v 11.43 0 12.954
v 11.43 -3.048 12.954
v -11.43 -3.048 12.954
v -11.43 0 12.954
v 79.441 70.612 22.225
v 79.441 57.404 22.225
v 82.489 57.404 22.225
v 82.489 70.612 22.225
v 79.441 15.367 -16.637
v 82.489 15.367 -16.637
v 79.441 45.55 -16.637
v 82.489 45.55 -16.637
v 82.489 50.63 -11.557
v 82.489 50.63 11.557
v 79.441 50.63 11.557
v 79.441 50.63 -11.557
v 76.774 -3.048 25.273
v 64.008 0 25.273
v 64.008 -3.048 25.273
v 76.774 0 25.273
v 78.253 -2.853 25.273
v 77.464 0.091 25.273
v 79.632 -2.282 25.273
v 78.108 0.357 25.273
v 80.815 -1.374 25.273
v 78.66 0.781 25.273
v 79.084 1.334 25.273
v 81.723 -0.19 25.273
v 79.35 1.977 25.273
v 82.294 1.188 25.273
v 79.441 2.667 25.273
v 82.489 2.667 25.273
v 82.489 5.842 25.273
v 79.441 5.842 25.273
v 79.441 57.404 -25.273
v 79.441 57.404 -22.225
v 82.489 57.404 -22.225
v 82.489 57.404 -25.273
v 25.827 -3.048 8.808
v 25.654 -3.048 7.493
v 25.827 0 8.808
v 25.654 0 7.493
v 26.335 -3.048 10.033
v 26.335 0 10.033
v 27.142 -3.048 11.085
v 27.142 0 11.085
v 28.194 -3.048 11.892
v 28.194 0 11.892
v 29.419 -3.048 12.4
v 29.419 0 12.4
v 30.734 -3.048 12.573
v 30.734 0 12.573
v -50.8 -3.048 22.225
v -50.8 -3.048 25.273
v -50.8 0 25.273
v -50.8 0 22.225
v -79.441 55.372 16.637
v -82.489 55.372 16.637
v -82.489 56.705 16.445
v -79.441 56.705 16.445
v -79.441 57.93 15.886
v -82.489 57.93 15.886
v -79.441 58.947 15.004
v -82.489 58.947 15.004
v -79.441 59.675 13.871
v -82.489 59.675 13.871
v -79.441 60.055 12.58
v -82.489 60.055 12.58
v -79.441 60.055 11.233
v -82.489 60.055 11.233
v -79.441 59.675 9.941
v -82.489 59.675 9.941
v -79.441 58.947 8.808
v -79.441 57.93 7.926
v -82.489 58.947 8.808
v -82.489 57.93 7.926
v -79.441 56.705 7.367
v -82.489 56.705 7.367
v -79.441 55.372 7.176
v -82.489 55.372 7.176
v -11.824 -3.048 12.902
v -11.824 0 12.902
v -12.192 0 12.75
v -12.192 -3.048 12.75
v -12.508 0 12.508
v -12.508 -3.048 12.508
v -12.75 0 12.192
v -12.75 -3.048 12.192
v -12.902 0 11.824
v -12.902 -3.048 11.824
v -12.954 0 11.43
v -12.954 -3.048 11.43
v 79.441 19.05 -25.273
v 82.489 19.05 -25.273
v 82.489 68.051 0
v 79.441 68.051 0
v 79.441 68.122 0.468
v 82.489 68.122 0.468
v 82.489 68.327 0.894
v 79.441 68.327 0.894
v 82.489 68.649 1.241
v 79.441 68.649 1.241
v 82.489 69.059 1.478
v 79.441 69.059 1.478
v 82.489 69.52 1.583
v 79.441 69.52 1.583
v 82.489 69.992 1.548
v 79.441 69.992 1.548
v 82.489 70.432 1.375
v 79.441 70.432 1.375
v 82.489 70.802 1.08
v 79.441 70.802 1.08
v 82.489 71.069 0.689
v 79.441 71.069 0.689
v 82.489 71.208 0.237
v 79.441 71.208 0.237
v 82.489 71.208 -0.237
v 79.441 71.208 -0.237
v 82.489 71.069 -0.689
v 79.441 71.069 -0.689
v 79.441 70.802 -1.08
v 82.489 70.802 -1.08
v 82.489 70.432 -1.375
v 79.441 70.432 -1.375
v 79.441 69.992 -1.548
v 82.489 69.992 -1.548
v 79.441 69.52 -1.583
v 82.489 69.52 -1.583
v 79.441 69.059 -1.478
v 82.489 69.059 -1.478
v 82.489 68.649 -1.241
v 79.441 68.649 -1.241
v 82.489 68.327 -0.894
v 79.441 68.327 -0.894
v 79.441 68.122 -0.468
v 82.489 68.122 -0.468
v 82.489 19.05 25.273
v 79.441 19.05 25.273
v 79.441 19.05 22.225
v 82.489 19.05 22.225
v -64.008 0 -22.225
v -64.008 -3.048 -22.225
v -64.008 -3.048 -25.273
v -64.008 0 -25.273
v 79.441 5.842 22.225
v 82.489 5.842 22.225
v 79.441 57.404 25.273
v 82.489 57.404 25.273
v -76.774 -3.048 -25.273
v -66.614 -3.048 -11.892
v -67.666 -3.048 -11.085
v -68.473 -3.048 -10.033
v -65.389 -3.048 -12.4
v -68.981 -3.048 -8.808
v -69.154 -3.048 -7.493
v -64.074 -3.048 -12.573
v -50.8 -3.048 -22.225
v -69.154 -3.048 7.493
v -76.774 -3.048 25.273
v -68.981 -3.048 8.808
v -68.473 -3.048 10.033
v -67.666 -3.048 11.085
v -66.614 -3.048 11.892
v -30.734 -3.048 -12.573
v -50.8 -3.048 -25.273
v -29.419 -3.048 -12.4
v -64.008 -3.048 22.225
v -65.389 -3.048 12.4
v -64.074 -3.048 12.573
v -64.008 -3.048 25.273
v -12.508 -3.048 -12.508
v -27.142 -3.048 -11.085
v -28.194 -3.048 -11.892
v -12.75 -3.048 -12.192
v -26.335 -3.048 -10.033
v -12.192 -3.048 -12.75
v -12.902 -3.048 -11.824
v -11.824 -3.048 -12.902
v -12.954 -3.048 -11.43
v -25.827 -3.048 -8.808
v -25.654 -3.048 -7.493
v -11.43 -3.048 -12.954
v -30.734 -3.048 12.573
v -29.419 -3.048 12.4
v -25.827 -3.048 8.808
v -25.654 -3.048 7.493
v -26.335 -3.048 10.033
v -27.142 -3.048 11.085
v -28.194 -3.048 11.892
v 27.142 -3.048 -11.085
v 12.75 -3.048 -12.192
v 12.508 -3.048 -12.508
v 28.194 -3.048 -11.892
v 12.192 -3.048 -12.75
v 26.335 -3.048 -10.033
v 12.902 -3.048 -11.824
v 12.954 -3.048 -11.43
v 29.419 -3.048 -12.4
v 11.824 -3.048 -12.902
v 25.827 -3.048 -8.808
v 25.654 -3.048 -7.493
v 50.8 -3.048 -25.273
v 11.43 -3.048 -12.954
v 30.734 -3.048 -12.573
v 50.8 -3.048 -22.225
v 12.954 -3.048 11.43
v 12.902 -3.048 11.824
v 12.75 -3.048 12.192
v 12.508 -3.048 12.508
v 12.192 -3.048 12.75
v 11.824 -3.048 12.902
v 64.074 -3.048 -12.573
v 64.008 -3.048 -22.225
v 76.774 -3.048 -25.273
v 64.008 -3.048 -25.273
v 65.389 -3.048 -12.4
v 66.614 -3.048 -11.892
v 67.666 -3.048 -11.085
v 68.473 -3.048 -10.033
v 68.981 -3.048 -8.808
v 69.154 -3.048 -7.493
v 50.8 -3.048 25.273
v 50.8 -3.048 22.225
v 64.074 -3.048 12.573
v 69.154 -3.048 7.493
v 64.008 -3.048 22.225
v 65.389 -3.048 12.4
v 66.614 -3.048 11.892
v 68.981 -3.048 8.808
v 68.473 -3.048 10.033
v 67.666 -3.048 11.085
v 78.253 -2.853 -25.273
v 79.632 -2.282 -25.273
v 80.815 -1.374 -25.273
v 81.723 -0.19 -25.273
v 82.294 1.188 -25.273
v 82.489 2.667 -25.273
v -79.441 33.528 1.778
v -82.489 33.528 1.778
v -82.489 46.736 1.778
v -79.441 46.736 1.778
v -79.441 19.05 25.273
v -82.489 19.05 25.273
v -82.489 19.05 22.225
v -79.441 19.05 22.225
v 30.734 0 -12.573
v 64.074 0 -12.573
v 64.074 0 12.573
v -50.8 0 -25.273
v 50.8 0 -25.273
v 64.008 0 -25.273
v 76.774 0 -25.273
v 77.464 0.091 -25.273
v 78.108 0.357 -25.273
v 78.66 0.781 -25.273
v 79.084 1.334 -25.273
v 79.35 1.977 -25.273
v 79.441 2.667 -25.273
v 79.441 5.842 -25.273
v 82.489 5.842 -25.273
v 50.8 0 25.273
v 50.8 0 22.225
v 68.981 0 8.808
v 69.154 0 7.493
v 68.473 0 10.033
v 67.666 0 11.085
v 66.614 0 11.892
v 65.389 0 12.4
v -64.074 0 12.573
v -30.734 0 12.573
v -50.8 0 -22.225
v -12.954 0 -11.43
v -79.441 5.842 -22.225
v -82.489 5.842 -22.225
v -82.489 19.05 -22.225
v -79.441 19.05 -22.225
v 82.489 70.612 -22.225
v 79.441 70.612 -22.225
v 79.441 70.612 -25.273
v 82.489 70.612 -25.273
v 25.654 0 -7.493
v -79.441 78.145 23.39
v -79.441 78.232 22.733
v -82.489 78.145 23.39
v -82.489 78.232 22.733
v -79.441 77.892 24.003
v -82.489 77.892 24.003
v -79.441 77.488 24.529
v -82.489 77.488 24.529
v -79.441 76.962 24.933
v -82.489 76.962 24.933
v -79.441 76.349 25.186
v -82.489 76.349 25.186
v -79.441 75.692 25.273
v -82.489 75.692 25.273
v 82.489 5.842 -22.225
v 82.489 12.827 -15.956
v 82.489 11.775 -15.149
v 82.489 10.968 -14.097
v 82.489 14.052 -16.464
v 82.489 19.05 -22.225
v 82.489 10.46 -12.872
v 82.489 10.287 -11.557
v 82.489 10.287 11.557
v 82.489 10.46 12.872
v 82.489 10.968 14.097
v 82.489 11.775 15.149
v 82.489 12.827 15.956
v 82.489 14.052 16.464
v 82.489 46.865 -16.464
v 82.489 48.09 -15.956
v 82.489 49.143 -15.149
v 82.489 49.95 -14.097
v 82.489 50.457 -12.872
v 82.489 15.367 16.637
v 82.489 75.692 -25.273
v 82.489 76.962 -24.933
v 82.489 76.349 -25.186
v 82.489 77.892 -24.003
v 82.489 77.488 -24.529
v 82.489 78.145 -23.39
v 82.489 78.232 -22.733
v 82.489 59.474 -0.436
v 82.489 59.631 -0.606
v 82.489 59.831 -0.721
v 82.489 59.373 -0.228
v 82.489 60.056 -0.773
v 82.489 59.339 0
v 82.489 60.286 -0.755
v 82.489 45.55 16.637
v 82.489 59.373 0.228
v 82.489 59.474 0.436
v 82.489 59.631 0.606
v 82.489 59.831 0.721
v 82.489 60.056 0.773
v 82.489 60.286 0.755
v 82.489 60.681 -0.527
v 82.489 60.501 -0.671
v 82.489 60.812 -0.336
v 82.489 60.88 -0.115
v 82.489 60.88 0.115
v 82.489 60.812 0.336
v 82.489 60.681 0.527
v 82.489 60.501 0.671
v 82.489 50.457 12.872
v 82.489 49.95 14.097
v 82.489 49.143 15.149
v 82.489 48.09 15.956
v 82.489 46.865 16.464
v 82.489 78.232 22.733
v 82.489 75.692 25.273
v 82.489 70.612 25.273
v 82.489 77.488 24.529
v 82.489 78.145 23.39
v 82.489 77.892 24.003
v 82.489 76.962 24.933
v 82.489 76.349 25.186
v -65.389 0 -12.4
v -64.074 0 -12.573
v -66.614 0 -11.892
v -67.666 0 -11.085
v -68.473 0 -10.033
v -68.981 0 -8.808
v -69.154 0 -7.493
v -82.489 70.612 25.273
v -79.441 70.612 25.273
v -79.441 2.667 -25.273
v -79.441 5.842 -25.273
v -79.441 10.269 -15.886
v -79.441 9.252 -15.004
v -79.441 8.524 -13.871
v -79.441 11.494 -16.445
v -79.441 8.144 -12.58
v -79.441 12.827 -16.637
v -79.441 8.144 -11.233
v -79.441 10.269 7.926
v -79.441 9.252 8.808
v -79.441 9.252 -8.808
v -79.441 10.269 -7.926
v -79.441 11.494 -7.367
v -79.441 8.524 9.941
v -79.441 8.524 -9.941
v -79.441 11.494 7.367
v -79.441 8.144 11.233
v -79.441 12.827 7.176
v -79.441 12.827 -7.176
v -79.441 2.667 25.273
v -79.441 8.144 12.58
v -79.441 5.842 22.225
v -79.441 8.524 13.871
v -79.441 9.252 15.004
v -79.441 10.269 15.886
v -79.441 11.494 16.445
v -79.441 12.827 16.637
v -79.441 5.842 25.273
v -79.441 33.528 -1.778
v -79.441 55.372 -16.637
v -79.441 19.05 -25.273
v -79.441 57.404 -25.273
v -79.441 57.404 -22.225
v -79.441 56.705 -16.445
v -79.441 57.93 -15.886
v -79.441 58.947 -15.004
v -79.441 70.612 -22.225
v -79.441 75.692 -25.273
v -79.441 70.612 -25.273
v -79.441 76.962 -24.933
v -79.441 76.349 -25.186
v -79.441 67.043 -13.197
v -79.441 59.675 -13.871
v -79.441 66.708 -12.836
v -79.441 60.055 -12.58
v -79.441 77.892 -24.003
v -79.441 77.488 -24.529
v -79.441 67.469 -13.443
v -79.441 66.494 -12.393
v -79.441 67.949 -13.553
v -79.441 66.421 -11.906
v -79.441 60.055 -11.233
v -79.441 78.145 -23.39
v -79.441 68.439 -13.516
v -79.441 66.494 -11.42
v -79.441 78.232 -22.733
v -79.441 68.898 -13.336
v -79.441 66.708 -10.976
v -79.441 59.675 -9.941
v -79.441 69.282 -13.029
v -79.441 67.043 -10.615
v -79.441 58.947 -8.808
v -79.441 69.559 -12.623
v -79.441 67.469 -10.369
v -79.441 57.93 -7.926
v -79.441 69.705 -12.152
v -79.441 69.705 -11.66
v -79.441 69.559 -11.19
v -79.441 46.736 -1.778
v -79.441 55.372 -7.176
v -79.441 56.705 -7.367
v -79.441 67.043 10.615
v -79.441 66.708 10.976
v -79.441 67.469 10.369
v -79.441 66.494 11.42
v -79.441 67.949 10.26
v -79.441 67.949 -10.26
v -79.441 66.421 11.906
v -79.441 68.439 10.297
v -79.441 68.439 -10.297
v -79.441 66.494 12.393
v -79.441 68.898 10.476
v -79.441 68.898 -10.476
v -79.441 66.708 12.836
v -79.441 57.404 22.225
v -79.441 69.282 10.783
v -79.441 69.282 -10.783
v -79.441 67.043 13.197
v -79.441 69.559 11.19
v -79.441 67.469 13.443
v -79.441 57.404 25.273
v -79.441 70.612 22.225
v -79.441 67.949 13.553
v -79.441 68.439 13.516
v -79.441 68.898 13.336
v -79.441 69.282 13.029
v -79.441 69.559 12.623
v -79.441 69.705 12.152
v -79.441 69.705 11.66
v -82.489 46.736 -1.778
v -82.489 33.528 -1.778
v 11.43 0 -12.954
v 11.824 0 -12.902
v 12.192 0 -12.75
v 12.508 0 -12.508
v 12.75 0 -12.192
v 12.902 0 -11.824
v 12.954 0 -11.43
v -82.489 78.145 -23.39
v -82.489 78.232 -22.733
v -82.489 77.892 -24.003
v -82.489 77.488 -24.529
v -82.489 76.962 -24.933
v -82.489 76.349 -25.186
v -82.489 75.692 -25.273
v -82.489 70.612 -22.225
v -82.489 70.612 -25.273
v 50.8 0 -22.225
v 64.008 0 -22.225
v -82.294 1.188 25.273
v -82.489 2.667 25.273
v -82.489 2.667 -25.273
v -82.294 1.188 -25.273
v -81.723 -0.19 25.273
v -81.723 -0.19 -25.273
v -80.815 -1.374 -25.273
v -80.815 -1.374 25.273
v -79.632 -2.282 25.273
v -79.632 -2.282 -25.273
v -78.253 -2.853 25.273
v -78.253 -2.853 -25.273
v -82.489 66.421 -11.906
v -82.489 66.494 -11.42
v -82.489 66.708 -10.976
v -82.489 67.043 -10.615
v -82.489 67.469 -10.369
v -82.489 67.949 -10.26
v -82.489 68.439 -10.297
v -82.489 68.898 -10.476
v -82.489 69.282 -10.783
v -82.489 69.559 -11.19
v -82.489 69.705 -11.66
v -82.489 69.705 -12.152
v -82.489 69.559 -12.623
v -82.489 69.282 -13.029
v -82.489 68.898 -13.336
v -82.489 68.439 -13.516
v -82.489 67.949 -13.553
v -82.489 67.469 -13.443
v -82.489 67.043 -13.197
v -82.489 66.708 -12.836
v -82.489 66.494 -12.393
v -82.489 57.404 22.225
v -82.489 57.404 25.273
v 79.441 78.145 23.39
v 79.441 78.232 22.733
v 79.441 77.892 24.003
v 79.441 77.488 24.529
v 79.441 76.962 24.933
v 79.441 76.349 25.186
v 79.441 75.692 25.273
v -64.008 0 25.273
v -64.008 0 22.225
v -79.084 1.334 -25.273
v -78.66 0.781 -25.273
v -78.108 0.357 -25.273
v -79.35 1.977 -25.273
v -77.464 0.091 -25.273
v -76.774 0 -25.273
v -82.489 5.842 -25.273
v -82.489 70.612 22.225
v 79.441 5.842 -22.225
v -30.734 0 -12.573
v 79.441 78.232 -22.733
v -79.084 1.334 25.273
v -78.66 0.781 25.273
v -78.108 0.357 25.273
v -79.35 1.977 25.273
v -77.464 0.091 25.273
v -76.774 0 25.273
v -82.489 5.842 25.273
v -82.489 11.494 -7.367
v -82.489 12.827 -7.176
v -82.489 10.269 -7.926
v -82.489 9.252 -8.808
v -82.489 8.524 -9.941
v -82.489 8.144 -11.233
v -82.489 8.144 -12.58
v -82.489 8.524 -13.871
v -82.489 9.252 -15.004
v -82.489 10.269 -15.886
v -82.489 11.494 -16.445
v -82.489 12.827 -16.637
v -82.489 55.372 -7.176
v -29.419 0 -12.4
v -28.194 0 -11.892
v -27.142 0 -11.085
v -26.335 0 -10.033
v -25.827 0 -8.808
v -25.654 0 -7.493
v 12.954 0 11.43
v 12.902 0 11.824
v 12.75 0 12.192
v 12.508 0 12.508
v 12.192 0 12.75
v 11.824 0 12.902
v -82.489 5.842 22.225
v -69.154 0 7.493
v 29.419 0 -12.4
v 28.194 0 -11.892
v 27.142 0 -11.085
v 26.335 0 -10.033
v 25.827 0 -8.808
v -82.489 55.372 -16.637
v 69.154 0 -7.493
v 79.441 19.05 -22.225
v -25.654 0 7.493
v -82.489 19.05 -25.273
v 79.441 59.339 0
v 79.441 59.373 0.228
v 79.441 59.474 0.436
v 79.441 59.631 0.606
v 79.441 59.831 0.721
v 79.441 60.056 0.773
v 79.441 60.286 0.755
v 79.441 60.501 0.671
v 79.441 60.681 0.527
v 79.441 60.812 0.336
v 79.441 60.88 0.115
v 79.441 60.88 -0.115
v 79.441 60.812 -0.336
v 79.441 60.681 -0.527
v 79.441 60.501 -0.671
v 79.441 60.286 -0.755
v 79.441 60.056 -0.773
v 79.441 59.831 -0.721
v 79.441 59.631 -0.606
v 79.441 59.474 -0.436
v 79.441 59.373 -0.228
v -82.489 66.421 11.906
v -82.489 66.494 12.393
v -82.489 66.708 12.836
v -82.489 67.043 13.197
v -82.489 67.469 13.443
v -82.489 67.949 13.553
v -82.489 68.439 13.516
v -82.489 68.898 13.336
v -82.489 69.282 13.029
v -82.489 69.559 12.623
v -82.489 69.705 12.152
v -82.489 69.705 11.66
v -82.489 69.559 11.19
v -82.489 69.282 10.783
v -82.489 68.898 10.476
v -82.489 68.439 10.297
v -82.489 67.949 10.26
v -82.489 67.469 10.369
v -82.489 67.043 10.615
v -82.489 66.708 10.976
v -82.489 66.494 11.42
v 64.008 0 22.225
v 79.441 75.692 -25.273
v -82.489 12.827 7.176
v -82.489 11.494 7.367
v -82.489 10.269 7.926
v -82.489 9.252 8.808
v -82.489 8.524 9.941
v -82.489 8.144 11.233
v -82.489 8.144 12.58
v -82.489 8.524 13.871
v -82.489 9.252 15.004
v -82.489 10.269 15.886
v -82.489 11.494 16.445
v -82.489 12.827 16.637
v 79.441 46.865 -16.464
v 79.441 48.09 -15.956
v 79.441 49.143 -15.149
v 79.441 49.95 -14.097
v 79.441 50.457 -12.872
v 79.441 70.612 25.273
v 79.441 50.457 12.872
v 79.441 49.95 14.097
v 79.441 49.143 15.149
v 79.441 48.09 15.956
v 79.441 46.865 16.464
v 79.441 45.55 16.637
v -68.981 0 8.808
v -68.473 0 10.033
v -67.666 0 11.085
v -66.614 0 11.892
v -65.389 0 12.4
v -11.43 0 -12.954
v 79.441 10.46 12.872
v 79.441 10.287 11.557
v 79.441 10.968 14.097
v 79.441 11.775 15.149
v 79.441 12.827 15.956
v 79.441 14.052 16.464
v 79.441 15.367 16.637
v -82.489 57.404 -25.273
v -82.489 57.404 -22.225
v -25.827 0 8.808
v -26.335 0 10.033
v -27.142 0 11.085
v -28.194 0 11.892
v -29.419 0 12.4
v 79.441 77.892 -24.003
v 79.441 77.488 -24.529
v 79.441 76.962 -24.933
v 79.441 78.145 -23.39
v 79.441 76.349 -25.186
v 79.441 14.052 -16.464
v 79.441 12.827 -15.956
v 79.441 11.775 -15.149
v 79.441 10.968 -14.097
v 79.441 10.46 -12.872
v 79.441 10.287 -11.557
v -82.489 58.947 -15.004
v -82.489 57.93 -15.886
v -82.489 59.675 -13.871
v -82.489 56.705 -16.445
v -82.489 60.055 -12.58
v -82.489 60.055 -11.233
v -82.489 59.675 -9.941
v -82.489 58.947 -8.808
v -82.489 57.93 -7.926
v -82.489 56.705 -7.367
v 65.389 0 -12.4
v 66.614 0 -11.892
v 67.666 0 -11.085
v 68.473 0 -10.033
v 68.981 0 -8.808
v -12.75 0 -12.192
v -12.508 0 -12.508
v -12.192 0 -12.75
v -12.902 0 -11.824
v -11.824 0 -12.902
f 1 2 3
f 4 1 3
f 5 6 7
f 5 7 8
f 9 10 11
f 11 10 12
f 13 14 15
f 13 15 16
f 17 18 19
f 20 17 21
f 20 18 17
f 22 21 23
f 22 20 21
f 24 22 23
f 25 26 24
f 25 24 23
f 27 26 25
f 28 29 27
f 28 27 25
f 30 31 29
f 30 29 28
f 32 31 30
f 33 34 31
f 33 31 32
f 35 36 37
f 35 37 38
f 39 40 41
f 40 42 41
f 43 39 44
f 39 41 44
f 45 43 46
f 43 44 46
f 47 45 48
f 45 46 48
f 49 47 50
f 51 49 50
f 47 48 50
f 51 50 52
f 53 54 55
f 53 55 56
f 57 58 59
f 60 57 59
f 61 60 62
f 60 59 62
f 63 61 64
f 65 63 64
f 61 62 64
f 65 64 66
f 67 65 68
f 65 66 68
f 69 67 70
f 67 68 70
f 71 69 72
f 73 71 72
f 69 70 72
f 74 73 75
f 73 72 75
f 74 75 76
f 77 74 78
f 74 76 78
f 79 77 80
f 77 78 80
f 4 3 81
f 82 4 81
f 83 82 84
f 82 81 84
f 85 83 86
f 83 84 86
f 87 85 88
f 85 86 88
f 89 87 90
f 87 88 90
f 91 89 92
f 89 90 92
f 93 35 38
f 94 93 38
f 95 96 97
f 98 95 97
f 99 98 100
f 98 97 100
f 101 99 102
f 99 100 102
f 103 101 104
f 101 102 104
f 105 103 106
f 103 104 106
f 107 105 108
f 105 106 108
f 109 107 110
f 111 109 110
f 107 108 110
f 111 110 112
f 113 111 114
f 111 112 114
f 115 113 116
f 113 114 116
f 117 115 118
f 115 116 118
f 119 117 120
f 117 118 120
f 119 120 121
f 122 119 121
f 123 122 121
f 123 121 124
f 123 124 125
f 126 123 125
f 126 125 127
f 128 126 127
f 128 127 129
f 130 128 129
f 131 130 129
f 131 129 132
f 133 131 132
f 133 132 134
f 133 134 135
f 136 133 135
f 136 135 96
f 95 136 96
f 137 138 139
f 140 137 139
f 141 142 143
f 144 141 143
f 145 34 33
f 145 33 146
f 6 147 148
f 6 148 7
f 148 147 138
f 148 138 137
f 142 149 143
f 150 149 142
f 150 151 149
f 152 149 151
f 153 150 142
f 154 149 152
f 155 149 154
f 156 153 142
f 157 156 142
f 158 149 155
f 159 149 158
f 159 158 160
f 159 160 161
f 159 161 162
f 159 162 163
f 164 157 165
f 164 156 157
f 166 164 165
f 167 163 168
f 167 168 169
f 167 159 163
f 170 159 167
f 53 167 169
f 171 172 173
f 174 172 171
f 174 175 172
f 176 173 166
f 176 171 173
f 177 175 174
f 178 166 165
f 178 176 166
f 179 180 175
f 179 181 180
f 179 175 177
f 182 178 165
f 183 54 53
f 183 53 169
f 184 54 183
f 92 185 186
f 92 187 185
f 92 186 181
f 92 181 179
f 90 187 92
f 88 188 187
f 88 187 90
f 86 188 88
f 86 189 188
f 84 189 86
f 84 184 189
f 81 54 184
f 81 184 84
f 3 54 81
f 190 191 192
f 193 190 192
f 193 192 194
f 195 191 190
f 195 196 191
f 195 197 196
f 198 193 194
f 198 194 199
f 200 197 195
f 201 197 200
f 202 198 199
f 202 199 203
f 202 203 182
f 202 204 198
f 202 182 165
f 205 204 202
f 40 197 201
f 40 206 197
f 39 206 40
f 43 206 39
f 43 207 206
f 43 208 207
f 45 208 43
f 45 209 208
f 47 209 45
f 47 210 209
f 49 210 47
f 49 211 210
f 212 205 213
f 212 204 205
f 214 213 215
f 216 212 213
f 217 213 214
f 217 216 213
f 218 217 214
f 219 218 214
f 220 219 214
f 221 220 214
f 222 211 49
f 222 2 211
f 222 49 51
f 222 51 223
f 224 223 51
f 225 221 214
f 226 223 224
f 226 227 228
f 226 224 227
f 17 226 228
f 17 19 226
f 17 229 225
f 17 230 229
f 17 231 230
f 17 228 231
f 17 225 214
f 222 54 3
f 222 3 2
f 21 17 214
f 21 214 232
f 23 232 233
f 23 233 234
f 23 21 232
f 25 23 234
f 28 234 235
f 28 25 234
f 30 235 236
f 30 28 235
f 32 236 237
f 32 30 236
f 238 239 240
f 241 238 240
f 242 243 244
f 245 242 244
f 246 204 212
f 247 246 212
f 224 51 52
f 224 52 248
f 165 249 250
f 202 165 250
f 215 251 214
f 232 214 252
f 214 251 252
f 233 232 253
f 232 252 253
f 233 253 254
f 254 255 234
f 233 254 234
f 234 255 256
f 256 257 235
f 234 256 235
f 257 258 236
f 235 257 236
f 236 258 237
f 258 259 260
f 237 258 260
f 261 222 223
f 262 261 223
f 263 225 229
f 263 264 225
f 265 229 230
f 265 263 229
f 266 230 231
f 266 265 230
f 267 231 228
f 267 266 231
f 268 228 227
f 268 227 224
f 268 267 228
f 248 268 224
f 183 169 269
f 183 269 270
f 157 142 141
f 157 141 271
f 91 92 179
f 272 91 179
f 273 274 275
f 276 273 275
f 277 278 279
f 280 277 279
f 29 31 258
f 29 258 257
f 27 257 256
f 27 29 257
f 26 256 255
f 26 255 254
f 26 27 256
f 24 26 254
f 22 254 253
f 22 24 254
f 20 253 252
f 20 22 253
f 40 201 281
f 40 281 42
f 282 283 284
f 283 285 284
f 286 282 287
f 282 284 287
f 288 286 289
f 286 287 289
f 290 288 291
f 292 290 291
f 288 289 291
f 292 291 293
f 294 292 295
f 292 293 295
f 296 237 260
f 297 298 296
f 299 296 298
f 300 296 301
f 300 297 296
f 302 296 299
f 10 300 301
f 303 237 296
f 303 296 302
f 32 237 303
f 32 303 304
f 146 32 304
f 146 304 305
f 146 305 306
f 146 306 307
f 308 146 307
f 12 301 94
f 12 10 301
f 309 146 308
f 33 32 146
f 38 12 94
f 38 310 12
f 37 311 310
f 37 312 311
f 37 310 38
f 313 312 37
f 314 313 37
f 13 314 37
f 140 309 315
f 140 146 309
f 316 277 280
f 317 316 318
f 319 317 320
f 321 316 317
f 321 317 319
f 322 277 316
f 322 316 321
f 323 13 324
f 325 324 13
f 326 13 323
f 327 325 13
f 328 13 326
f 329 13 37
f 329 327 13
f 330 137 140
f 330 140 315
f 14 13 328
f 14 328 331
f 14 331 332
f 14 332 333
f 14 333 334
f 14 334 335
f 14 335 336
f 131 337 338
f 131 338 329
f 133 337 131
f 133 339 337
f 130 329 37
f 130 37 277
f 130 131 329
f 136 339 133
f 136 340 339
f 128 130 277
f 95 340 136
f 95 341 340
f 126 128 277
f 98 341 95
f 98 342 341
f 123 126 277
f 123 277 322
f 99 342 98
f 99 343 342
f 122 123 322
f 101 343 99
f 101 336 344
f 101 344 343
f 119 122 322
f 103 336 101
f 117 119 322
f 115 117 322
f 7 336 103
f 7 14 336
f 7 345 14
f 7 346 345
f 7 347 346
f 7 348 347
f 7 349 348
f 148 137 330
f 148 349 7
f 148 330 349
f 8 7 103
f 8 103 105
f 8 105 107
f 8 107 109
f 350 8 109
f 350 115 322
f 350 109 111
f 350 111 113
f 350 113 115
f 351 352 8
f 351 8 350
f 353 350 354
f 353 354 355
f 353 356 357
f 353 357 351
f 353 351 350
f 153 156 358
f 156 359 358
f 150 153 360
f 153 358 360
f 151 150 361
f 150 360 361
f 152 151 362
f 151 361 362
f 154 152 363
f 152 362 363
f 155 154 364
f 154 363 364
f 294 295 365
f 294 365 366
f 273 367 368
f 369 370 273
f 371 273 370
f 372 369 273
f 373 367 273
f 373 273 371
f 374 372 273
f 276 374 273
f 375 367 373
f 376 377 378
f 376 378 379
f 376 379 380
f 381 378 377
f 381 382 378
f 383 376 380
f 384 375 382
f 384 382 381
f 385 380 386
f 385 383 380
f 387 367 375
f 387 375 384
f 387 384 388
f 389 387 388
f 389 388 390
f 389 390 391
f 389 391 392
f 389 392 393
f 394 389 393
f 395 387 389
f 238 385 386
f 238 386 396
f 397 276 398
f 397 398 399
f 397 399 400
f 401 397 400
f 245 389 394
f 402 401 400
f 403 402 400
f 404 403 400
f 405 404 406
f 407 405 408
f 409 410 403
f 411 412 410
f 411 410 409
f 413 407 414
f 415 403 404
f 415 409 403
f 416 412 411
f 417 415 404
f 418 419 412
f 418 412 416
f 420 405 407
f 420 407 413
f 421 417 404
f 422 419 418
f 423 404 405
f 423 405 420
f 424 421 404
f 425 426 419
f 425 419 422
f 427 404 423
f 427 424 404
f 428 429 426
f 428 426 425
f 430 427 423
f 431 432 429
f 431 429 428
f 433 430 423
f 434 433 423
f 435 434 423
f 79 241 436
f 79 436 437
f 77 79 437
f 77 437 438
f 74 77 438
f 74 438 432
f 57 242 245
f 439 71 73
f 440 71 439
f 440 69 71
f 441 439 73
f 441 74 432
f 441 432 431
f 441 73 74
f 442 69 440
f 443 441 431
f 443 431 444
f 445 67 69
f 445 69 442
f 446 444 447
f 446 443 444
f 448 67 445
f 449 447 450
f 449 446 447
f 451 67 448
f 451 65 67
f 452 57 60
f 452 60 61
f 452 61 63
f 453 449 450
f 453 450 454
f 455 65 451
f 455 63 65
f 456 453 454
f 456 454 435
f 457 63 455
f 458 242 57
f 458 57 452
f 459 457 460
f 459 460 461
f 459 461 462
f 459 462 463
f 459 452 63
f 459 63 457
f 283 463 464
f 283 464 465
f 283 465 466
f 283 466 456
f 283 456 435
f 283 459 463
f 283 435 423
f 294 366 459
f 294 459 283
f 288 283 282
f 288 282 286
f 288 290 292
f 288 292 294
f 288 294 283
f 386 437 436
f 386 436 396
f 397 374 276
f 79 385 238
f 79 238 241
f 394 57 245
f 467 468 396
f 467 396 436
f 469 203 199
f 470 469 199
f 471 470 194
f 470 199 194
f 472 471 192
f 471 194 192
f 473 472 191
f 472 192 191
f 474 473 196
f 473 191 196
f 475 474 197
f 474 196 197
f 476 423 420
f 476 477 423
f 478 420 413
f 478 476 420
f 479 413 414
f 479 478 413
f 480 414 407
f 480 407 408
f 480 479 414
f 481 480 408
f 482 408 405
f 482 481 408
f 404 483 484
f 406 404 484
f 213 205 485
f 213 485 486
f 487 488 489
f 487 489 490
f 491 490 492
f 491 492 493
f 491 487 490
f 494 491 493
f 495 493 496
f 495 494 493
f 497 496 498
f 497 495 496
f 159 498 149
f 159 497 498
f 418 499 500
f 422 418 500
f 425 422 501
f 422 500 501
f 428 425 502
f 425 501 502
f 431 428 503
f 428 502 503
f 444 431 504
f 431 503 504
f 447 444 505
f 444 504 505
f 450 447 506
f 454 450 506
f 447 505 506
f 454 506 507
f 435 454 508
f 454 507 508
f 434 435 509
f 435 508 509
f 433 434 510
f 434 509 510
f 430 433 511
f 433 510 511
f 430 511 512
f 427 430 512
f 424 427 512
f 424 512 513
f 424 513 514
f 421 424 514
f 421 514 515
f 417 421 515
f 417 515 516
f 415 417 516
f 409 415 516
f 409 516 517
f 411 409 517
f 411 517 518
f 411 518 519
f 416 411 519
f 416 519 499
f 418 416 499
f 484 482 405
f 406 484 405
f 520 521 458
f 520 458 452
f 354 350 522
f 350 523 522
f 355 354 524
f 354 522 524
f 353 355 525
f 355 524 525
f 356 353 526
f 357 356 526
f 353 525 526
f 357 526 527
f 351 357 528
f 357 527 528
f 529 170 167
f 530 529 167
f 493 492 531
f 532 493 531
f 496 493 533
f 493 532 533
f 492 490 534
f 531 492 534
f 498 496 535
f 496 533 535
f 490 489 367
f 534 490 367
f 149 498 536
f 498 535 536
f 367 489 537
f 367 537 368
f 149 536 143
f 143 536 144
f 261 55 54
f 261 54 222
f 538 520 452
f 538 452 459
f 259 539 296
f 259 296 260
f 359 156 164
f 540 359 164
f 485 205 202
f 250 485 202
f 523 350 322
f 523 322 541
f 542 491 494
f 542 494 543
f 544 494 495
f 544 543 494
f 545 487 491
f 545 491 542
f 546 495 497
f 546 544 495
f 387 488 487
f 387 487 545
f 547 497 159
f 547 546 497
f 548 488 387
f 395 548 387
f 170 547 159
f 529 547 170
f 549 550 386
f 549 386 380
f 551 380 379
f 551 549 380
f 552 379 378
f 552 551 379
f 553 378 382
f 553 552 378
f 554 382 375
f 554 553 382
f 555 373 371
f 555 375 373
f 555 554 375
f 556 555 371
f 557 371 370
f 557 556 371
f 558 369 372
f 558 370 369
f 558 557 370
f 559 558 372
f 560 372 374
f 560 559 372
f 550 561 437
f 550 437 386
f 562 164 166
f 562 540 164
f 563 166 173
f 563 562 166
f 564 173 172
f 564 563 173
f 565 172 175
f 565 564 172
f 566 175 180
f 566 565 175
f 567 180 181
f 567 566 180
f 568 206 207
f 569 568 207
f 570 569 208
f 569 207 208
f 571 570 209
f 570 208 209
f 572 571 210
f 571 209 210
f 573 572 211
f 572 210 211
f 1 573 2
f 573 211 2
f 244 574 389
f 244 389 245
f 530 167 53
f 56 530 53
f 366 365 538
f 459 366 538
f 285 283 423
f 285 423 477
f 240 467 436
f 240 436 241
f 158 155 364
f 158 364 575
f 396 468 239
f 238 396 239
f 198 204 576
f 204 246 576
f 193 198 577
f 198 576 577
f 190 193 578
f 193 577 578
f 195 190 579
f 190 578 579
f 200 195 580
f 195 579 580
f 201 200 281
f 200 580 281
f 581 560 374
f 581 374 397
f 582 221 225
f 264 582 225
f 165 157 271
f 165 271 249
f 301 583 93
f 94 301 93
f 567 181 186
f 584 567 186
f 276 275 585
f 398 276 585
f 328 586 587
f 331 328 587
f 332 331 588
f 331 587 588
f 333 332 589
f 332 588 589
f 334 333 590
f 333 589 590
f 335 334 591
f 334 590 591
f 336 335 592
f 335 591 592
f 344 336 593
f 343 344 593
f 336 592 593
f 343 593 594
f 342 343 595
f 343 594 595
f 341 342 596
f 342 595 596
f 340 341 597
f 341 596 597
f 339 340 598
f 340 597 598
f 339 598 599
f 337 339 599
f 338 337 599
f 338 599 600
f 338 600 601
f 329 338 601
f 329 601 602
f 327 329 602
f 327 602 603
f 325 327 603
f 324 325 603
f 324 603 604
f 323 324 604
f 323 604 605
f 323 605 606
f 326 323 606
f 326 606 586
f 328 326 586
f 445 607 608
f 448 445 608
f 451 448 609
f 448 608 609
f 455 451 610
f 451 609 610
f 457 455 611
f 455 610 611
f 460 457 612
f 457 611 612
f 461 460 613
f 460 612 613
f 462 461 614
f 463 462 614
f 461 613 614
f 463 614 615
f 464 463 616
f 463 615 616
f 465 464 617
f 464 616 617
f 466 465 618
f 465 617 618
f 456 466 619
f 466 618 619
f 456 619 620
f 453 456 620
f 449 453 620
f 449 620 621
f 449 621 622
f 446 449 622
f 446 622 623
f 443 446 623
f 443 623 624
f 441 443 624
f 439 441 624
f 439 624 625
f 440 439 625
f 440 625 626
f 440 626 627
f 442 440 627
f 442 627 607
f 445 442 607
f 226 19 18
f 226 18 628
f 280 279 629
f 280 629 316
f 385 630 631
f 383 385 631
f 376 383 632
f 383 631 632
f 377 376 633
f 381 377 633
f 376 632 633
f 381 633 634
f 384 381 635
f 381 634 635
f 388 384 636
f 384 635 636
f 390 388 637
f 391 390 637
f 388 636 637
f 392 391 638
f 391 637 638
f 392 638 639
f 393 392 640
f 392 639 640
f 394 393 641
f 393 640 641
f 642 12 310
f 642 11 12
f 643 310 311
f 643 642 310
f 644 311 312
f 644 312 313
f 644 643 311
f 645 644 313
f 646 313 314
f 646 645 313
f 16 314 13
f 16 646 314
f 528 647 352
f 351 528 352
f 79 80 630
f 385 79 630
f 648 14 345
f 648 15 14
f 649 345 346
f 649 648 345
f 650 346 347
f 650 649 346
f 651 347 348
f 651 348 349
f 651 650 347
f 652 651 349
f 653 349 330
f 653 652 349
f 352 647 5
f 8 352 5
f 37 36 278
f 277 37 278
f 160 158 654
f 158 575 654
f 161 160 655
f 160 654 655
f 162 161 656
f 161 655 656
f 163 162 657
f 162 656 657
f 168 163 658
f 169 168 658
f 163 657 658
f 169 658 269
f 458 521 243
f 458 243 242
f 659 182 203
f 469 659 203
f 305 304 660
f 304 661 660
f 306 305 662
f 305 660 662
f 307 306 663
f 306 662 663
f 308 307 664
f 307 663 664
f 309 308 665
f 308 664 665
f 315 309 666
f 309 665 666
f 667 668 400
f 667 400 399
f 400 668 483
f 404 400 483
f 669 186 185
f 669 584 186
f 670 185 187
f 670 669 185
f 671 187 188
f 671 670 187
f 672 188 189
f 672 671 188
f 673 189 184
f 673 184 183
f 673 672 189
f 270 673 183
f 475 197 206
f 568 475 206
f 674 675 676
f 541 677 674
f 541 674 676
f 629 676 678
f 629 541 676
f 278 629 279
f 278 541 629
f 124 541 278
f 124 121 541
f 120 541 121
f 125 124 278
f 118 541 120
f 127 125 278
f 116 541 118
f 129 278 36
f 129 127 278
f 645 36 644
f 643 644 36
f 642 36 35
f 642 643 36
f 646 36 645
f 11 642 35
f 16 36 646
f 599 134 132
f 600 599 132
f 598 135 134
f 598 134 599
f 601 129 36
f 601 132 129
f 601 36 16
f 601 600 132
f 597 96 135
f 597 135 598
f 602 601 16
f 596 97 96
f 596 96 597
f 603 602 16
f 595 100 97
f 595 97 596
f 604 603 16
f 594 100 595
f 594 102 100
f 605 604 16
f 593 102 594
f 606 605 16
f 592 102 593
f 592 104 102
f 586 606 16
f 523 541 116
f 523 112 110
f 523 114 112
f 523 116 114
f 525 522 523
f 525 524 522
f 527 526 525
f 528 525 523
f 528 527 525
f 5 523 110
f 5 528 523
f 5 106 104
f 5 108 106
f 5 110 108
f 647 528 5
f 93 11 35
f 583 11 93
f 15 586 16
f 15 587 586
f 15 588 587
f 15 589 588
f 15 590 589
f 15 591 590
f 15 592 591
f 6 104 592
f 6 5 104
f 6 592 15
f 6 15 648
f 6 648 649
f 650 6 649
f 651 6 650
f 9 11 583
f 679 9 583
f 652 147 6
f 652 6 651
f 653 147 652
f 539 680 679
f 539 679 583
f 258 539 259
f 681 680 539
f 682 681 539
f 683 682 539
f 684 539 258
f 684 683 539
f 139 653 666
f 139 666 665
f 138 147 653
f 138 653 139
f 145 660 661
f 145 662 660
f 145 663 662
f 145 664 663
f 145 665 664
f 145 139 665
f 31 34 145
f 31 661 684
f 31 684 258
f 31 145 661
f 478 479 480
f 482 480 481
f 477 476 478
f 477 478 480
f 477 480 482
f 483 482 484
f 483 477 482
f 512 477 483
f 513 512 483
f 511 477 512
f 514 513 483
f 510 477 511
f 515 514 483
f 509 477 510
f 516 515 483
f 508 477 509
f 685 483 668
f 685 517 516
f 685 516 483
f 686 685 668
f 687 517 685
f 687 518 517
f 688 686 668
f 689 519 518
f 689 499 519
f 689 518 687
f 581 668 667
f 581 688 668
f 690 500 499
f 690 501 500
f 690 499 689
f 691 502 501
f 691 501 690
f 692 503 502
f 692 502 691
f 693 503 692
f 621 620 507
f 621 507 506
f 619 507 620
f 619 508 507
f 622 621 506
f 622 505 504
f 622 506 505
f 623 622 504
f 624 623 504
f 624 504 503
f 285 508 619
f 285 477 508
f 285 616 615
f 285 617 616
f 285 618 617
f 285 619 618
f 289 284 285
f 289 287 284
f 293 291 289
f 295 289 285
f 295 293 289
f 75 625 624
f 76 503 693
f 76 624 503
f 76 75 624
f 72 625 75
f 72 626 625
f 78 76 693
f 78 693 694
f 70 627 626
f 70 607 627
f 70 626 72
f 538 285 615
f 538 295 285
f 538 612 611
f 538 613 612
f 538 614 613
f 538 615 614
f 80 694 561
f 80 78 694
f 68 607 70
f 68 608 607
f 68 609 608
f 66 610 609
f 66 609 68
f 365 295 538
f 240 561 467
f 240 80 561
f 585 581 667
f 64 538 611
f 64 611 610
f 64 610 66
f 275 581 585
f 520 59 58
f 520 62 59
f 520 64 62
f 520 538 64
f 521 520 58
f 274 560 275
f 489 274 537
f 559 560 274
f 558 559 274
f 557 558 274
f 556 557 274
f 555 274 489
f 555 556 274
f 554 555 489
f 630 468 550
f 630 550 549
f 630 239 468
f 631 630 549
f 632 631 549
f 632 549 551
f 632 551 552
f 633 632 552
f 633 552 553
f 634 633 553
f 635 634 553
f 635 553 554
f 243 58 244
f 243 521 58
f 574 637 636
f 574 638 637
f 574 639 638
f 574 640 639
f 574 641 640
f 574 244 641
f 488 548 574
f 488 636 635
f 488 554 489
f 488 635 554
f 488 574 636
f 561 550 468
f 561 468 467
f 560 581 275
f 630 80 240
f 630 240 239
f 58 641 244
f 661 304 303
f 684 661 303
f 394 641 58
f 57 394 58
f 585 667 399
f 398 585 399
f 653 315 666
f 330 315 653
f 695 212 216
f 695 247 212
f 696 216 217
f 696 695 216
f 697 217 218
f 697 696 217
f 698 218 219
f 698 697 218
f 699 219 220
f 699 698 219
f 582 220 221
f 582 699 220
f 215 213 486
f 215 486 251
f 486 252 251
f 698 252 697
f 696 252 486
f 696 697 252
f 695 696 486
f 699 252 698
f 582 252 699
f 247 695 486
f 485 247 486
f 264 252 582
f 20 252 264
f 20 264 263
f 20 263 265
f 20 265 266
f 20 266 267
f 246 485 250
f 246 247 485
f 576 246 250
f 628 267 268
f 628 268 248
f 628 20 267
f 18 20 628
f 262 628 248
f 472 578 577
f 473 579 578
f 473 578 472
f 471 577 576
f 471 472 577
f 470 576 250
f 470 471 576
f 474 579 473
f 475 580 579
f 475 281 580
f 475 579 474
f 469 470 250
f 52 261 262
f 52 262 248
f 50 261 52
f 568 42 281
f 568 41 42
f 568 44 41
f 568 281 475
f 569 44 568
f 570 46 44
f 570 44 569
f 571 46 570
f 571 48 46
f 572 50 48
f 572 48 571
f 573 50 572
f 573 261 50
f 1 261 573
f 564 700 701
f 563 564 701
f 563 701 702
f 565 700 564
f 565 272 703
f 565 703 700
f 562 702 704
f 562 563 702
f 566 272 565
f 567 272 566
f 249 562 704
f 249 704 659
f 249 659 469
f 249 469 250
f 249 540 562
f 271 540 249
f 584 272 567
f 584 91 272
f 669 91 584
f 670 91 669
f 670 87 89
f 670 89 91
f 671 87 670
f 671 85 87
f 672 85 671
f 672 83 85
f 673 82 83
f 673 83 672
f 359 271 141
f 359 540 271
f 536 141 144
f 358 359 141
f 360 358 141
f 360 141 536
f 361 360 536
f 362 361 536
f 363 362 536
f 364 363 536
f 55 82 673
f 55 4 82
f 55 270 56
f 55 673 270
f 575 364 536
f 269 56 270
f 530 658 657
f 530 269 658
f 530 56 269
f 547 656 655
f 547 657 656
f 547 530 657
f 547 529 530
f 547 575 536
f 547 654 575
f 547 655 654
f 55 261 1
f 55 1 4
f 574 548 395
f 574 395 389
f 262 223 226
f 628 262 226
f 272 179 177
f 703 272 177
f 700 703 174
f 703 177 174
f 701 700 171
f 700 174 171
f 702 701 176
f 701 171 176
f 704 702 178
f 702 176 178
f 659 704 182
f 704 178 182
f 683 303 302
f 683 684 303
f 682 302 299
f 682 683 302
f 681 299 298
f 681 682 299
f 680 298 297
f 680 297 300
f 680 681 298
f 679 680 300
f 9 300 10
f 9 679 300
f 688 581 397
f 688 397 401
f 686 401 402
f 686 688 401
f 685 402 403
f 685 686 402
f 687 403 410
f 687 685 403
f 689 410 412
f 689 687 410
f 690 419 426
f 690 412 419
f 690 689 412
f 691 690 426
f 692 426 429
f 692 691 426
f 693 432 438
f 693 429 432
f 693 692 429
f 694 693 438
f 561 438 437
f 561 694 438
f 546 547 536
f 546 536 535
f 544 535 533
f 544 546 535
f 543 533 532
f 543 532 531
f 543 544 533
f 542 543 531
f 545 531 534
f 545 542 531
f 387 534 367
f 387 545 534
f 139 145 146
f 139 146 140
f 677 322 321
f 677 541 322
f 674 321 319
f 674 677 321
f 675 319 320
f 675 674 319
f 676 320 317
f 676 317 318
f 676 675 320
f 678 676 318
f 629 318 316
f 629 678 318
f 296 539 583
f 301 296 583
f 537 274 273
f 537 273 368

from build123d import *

# Parameters (mm, degrees)
BASE_FLANGE1_DEPTH      = 25.273
CUT_EXTRUDE1_DEPTH      = 117.462097169
CUT_EXTRUDE1_DEPTH_BACK = 117.462097169
SKETCH6_W               = 13.208
SKETCH6_H               = 3.048
CUT_EXTRUDE2_DEPTH      = 182.604935466
CUT_EXTRUDE2_DEPTH_BACK = 182.604935466
SKETCH7_W               = 3.048
SKETCH7_H               = 13.208
FILLET1_R               = 2.54
SKETCH9_R               = 1.5875
SKETCH9_R_2             = 0.7747
CUT_EXTRUDE4_DEPTH      = 182.604935466
CUT_EXTRUDE5_REACH      = 186.328
SKETCH10_R              = 1.651
CUT_EXTRUDE6_REACH      = 186.328
SKETCH11_W              = 3.556
SKETCH11_H              = 13.208
CUT_EXTRUDE8_REACH      = 120.531
SKETCH15_W              = 43.500088515
SKETCH15_H              = 25.146
FILLET2_R               = 5.08
CUT_EXTRUDE9_REACH      = 186.328
CUT_EXTRUDE12_REACH     = 186.328
SKETCH21_W              = 33.274
SKETCH21_H              = 40.343404573
FILLET4_R               = 5.08


# Sheet-metal steps are written as plain solids
with BuildPart() as part:
    # Sketch1 → Base-Flange1 (new, symmetric)
    with BuildSketch(Plane.XY):
        with BuildLine():
            Line((79.441088515, 78.232), (79.441088515, 2.667))
            ThreePointArc((79.441088515, 2.667), (78.6599423, 0.781146215), (76.774088515, 0))
            Line((76.774088515, 0), (-76.774088515, 0))
            ThreePointArc((-76.774088515, 0), (-78.6599423, 0.781146215), (-79.441088515, 2.667))
            Line((-79.441088515, 2.667), (-79.441088515, 78.232))
            Line((-79.441088515, 78.232), (-82.489088515, 78.232))
            Line((-82.489088515, 78.232), (-82.489088515, 2.667))
            ThreePointArc((-82.489088515, 2.667), (-80.815203769, -1.374115254), (-76.774088515, -3.048))
            Line((-76.774088515, -3.048), (76.774088515, -3.048))
            ThreePointArc((76.774088515, -3.048), (80.815203769, -1.374115254), (82.489088515, 2.667))
            Line((82.489088515, 2.667), (82.489088515, 78.232))
            Line((82.489088515, 78.232), (79.441088515, 78.232))
        make_face()
    extrude(amount=BASE_FLANGE1_DEPTH, both=True)

    # Sketch6 → Cut-Extrude1 (cut, two sides: drawn at the far end of the back side and taken through both)
    with BuildSketch(Plane(origin=(0, 0, 0), x_dir=(1, 0, 0), z_dir=(0, 1, 0)).offset(-CUT_EXTRUDE1_DEPTH_BACK)):
        with Locations((-57.404, 23.749)):
            Rectangle(SKETCH6_W, SKETCH6_H)
        with Locations((-57.404, -23.749)):
            Rectangle(SKETCH6_W, SKETCH6_H)
        with Locations((57.404, -23.749)):
            Rectangle(SKETCH6_W, SKETCH6_H)
        with Locations((57.404, 23.749)):
            Rectangle(SKETCH6_W, SKETCH6_H)
    extrude(amount=CUT_EXTRUDE1_DEPTH + CUT_EXTRUDE1_DEPTH_BACK, mode=Mode.SUBTRACT)

    # Sketch7 → Cut-Extrude2 (cut, two sides: drawn at the far end of the back side and taken through both)
    with BuildSketch(Plane(origin=(-79.441088515, 0, 0), x_dir=(0, 0, -1), z_dir=(1, 0, 0)).offset(-CUT_EXTRUDE2_DEPTH_BACK)):
        with Locations((-23.749, 12.446)):
            Rectangle(SKETCH7_W, SKETCH7_H)
        with Locations((23.749, 12.446)):
            Rectangle(SKETCH7_W, SKETCH7_H)
        with Locations((23.749, 64.008)):
            Rectangle(SKETCH7_W, SKETCH7_H)
        with Locations((-23.749, 64.008)):
            Rectangle(SKETCH7_W, SKETCH7_H)
    extrude(amount=CUT_EXTRUDE2_DEPTH + CUT_EXTRUDE2_DEPTH_BACK, mode=Mode.SUBTRACT)

    # Fillet1
    fillet1_edges = [part.edges().sort_by_distance(p)[0] for p in [
        (80.965088515, 78.232, -25.273),
        (-80.965088515, 78.232, -25.273),
        (80.965088515, 78.232, 25.273),
        (-80.965088515, 78.232, 25.273),
    ]]
    fillet(fillet1_edges, radius=FILLET1_R)

    # Sketch9 → Cut-Extrude4 (cut, through all)
    with BuildSketch(Plane.ZY.offset(-79.441088515)):
        with Locations(Location((0, 69.638595427, 0), (0, 0, 270))):
            Circle(SKETCH9_R)
        with Locations(Location((0, 60.113595427, 0), (0, 0, 270))):
            Circle(SKETCH9_R_2)
    extrude(amount=-CUT_EXTRUDE4_DEPTH, mode=Mode.SUBTRACT)

    # Sketch10 → Cut-Extrude5 (cut, up to next)
    with BuildSketch(Plane.ZY.offset(82.489088515), mode=Mode.PRIVATE) as cut_extrude5_sk1:
        with Locations(Location((11.90625, 68.072, 0), (0, 0, 270))):
            Circle(SKETCH10_R)
    cut_extrude5_tool1 = extrude(cut_extrude5_sk1.sketch, amount=-CUT_EXTRUDE5_REACH, mode=Mode.PRIVATE) & part.part
    # Sketch10 → Cut-Extrude5 (cut, up to next)
    with BuildSketch(Plane.ZY.offset(82.489088515), mode=Mode.PRIVATE) as cut_extrude5_sk2:
        with Locations(Location((-11.90625, 68.072, 0), (0, 0, 270))):
            Circle(SKETCH10_R)
    cut_extrude5_tool2 = extrude(cut_extrude5_sk2.sketch, amount=-CUT_EXTRUDE5_REACH, mode=Mode.PRIVATE) & part.part
    add(cut_extrude5_tool1.solids().sort_by_distance((-82.489089, 68.072, 11.90625))[0], mode=Mode.SUBTRACT)
    add(cut_extrude5_tool2.solids().sort_by_distance((-82.489089, 68.072, -11.90625))[0], mode=Mode.SUBTRACT)

    # Sketch11 → Cut-Extrude6 (cut, up to next)
    with BuildSketch(Plane.ZY.offset(82.489088515), mode=Mode.PRIVATE) as cut_extrude6_sk1:
        with Locations((0, 40.132)):
            Rectangle(SKETCH11_W, SKETCH11_H)
    cut_extrude6_tool1 = extrude(cut_extrude6_sk1.sketch, amount=-CUT_EXTRUDE6_REACH, mode=Mode.PRIVATE) & part.part
    add(cut_extrude6_tool1.solids().sort_by_distance((-82.489089, 40.132, 0))[0], mode=Mode.SUBTRACT)

    # Sketch15 → Cut-Extrude8 (cut, up to next)
    with BuildSketch(Plane.XZ.offset(3.048), mode=Mode.PRIVATE) as cut_extrude8_sk1:
        with Locations((-47.404044257, 0)):
            Rectangle(SKETCH15_W, SKETCH15_H)
    cut_extrude8_tool1 = extrude(cut_extrude8_sk1.sketch, amount=-CUT_EXTRUDE8_REACH, mode=Mode.PRIVATE) & part.part
    # Sketch15 → Cut-Extrude8 (cut, up to next)
    with BuildSketch(Plane.XZ.offset(3.048), mode=Mode.PRIVATE) as cut_extrude8_sk2:
        with Locations((47.404044257, 0)):
            Rectangle(SKETCH15_W, SKETCH15_H)
    cut_extrude8_tool2 = extrude(cut_extrude8_sk2.sketch, amount=-CUT_EXTRUDE8_REACH, mode=Mode.PRIVATE) & part.part
    # Sketch15 → Cut-Extrude8 (cut, up to next)
    with BuildSketch(Plane.XZ.offset(3.048), mode=Mode.PRIVATE) as cut_extrude8_sk3:
        with BuildLine():
            Line((12.954, -11.43), (12.954, 11.43))
            ThreePointArc((12.954, 11.43), (12.507630735, 12.507630735), (11.43, 12.954))
            Line((11.43, 12.954), (-11.43, 12.954))
            ThreePointArc((-11.43, 12.954), (-12.507630735, 12.507630735), (-12.954, 11.43))
            Line((-12.954, 11.43), (-12.954, -11.43))
            ThreePointArc((-12.954, -11.43), (-12.507630735, -12.507630735), (-11.43, -12.954))
            Line((-11.43, -12.954), (11.43, -12.954))
            ThreePointArc((11.43, -12.954), (12.507630735, -12.507630735), (12.954, -11.43))
        make_face()
    cut_extrude8_tool3 = extrude(cut_extrude8_sk3.sketch, amount=-CUT_EXTRUDE8_REACH, mode=Mode.PRIVATE) & part.part
    add(cut_extrude8_tool1.solids().sort_by_distance((-47.404044, -3.048, 0))[0], mode=Mode.SUBTRACT)
    add(cut_extrude8_tool2.solids().sort_by_distance((47.404044, -3.048, 0))[0], mode=Mode.SUBTRACT)
    add(cut_extrude8_tool3.solids().sort_by_distance((0, -3.048, 0))[0], mode=Mode.SUBTRACT)

    # Fillet2
    fillet2_edges = [part.edges().sort_by_distance(p)[0] for p in [
        (-69.154088515, -1.524, -12.573),
        (-69.154088515, -1.524, 12.573),
        (-25.654, -1.524, 12.573),
        (-25.654, -1.524, -12.573),
        (25.654, -1.524, 12.573),
        (69.154088515, -1.524, 12.573),
        (69.154088515, -1.524, -12.573),
        (25.654, -1.524, -12.573),
    ]]
    fillet(fillet2_edges, radius=FILLET2_R)

    # Sketch17 → Cut-Extrude9 (cut, up to next)
    with BuildSketch(Plane.ZY.offset(82.489088515), mode=Mode.PRIVATE) as cut_extrude9_sk1:
        with BuildLine():
            Line((-7.1755, 55.372), (-7.1755, 12.827))
            ThreePointArc((-7.1755, 12.827), (-11.90625, 8.09625), (-16.637, 12.827))
            Line((-16.637, 12.827), (-16.637, 55.372))
            ThreePointArc((-16.637, 55.372), (-11.90625, 60.10275), (-7.1755, 55.372))
        make_face()
    cut_extrude9_tool1 = extrude(cut_extrude9_sk1.sketch, amount=-CUT_EXTRUDE9_REACH, mode=Mode.PRIVATE) & part.part
    # Sketch17 → Cut-Extrude9 (cut, up to next)
    with BuildSketch(Plane.ZY.offset(82.489088515), mode=Mode.PRIVATE) as cut_extrude9_sk2:
        with BuildLine():
            Line((7.1755, 55.372), (7.1755, 12.827))
            ThreePointArc((7.1755, 12.827), (11.90625, 8.09625), (16.637, 12.827))
            Line((16.637, 12.827), (16.637, 55.372))
            ThreePointArc((16.637, 55.372), (11.90625, 60.10275), (7.1755, 55.372))
        make_face()
    cut_extrude9_tool2 = extrude(cut_extrude9_sk2.sketch, amount=-CUT_EXTRUDE9_REACH, mode=Mode.PRIVATE) & part.part
    add(cut_extrude9_tool1.solids().sort_by_distance((-82.489089, 34.0995, -11.90625))[0], mode=Mode.SUBTRACT)
    add(cut_extrude9_tool2.solids().sort_by_distance((-82.489089, 34.0995, 11.90625))[0], mode=Mode.SUBTRACT)

    # Sketch21 → Cut-Extrude12 (cut, up to next)
    with BuildSketch(Plane(origin=(82.489088515, 0, 0), x_dir=(0, 0, -1), z_dir=(1, 0, 0)), mode=Mode.PRIVATE) as cut_extrude12_sk1:
        with Locations((0, 30.458702286)):
            Rectangle(SKETCH21_W, SKETCH21_H)
    cut_extrude12_tool1 = extrude(cut_extrude12_sk1.sketch, amount=-CUT_EXTRUDE12_REACH, mode=Mode.PRIVATE) & part.part
    add(cut_extrude12_tool1.solids().sort_by_distance((82.489089, 30.458702, 0))[0], mode=Mode.SUBTRACT)

    # Fillet4
    fillet4_edges = [part.edges().sort_by_distance(p)[0] for p in [
        (80.965088515, 50.630404573, -16.637),
        (80.965088515, 10.287, -16.637),
        (80.965088515, 10.287, 16.637),
        (80.965088515, 50.630404573, 16.637),
    ]]
    fillet(fillet4_edges, radius=FILLET4_R)


solid = part.part
